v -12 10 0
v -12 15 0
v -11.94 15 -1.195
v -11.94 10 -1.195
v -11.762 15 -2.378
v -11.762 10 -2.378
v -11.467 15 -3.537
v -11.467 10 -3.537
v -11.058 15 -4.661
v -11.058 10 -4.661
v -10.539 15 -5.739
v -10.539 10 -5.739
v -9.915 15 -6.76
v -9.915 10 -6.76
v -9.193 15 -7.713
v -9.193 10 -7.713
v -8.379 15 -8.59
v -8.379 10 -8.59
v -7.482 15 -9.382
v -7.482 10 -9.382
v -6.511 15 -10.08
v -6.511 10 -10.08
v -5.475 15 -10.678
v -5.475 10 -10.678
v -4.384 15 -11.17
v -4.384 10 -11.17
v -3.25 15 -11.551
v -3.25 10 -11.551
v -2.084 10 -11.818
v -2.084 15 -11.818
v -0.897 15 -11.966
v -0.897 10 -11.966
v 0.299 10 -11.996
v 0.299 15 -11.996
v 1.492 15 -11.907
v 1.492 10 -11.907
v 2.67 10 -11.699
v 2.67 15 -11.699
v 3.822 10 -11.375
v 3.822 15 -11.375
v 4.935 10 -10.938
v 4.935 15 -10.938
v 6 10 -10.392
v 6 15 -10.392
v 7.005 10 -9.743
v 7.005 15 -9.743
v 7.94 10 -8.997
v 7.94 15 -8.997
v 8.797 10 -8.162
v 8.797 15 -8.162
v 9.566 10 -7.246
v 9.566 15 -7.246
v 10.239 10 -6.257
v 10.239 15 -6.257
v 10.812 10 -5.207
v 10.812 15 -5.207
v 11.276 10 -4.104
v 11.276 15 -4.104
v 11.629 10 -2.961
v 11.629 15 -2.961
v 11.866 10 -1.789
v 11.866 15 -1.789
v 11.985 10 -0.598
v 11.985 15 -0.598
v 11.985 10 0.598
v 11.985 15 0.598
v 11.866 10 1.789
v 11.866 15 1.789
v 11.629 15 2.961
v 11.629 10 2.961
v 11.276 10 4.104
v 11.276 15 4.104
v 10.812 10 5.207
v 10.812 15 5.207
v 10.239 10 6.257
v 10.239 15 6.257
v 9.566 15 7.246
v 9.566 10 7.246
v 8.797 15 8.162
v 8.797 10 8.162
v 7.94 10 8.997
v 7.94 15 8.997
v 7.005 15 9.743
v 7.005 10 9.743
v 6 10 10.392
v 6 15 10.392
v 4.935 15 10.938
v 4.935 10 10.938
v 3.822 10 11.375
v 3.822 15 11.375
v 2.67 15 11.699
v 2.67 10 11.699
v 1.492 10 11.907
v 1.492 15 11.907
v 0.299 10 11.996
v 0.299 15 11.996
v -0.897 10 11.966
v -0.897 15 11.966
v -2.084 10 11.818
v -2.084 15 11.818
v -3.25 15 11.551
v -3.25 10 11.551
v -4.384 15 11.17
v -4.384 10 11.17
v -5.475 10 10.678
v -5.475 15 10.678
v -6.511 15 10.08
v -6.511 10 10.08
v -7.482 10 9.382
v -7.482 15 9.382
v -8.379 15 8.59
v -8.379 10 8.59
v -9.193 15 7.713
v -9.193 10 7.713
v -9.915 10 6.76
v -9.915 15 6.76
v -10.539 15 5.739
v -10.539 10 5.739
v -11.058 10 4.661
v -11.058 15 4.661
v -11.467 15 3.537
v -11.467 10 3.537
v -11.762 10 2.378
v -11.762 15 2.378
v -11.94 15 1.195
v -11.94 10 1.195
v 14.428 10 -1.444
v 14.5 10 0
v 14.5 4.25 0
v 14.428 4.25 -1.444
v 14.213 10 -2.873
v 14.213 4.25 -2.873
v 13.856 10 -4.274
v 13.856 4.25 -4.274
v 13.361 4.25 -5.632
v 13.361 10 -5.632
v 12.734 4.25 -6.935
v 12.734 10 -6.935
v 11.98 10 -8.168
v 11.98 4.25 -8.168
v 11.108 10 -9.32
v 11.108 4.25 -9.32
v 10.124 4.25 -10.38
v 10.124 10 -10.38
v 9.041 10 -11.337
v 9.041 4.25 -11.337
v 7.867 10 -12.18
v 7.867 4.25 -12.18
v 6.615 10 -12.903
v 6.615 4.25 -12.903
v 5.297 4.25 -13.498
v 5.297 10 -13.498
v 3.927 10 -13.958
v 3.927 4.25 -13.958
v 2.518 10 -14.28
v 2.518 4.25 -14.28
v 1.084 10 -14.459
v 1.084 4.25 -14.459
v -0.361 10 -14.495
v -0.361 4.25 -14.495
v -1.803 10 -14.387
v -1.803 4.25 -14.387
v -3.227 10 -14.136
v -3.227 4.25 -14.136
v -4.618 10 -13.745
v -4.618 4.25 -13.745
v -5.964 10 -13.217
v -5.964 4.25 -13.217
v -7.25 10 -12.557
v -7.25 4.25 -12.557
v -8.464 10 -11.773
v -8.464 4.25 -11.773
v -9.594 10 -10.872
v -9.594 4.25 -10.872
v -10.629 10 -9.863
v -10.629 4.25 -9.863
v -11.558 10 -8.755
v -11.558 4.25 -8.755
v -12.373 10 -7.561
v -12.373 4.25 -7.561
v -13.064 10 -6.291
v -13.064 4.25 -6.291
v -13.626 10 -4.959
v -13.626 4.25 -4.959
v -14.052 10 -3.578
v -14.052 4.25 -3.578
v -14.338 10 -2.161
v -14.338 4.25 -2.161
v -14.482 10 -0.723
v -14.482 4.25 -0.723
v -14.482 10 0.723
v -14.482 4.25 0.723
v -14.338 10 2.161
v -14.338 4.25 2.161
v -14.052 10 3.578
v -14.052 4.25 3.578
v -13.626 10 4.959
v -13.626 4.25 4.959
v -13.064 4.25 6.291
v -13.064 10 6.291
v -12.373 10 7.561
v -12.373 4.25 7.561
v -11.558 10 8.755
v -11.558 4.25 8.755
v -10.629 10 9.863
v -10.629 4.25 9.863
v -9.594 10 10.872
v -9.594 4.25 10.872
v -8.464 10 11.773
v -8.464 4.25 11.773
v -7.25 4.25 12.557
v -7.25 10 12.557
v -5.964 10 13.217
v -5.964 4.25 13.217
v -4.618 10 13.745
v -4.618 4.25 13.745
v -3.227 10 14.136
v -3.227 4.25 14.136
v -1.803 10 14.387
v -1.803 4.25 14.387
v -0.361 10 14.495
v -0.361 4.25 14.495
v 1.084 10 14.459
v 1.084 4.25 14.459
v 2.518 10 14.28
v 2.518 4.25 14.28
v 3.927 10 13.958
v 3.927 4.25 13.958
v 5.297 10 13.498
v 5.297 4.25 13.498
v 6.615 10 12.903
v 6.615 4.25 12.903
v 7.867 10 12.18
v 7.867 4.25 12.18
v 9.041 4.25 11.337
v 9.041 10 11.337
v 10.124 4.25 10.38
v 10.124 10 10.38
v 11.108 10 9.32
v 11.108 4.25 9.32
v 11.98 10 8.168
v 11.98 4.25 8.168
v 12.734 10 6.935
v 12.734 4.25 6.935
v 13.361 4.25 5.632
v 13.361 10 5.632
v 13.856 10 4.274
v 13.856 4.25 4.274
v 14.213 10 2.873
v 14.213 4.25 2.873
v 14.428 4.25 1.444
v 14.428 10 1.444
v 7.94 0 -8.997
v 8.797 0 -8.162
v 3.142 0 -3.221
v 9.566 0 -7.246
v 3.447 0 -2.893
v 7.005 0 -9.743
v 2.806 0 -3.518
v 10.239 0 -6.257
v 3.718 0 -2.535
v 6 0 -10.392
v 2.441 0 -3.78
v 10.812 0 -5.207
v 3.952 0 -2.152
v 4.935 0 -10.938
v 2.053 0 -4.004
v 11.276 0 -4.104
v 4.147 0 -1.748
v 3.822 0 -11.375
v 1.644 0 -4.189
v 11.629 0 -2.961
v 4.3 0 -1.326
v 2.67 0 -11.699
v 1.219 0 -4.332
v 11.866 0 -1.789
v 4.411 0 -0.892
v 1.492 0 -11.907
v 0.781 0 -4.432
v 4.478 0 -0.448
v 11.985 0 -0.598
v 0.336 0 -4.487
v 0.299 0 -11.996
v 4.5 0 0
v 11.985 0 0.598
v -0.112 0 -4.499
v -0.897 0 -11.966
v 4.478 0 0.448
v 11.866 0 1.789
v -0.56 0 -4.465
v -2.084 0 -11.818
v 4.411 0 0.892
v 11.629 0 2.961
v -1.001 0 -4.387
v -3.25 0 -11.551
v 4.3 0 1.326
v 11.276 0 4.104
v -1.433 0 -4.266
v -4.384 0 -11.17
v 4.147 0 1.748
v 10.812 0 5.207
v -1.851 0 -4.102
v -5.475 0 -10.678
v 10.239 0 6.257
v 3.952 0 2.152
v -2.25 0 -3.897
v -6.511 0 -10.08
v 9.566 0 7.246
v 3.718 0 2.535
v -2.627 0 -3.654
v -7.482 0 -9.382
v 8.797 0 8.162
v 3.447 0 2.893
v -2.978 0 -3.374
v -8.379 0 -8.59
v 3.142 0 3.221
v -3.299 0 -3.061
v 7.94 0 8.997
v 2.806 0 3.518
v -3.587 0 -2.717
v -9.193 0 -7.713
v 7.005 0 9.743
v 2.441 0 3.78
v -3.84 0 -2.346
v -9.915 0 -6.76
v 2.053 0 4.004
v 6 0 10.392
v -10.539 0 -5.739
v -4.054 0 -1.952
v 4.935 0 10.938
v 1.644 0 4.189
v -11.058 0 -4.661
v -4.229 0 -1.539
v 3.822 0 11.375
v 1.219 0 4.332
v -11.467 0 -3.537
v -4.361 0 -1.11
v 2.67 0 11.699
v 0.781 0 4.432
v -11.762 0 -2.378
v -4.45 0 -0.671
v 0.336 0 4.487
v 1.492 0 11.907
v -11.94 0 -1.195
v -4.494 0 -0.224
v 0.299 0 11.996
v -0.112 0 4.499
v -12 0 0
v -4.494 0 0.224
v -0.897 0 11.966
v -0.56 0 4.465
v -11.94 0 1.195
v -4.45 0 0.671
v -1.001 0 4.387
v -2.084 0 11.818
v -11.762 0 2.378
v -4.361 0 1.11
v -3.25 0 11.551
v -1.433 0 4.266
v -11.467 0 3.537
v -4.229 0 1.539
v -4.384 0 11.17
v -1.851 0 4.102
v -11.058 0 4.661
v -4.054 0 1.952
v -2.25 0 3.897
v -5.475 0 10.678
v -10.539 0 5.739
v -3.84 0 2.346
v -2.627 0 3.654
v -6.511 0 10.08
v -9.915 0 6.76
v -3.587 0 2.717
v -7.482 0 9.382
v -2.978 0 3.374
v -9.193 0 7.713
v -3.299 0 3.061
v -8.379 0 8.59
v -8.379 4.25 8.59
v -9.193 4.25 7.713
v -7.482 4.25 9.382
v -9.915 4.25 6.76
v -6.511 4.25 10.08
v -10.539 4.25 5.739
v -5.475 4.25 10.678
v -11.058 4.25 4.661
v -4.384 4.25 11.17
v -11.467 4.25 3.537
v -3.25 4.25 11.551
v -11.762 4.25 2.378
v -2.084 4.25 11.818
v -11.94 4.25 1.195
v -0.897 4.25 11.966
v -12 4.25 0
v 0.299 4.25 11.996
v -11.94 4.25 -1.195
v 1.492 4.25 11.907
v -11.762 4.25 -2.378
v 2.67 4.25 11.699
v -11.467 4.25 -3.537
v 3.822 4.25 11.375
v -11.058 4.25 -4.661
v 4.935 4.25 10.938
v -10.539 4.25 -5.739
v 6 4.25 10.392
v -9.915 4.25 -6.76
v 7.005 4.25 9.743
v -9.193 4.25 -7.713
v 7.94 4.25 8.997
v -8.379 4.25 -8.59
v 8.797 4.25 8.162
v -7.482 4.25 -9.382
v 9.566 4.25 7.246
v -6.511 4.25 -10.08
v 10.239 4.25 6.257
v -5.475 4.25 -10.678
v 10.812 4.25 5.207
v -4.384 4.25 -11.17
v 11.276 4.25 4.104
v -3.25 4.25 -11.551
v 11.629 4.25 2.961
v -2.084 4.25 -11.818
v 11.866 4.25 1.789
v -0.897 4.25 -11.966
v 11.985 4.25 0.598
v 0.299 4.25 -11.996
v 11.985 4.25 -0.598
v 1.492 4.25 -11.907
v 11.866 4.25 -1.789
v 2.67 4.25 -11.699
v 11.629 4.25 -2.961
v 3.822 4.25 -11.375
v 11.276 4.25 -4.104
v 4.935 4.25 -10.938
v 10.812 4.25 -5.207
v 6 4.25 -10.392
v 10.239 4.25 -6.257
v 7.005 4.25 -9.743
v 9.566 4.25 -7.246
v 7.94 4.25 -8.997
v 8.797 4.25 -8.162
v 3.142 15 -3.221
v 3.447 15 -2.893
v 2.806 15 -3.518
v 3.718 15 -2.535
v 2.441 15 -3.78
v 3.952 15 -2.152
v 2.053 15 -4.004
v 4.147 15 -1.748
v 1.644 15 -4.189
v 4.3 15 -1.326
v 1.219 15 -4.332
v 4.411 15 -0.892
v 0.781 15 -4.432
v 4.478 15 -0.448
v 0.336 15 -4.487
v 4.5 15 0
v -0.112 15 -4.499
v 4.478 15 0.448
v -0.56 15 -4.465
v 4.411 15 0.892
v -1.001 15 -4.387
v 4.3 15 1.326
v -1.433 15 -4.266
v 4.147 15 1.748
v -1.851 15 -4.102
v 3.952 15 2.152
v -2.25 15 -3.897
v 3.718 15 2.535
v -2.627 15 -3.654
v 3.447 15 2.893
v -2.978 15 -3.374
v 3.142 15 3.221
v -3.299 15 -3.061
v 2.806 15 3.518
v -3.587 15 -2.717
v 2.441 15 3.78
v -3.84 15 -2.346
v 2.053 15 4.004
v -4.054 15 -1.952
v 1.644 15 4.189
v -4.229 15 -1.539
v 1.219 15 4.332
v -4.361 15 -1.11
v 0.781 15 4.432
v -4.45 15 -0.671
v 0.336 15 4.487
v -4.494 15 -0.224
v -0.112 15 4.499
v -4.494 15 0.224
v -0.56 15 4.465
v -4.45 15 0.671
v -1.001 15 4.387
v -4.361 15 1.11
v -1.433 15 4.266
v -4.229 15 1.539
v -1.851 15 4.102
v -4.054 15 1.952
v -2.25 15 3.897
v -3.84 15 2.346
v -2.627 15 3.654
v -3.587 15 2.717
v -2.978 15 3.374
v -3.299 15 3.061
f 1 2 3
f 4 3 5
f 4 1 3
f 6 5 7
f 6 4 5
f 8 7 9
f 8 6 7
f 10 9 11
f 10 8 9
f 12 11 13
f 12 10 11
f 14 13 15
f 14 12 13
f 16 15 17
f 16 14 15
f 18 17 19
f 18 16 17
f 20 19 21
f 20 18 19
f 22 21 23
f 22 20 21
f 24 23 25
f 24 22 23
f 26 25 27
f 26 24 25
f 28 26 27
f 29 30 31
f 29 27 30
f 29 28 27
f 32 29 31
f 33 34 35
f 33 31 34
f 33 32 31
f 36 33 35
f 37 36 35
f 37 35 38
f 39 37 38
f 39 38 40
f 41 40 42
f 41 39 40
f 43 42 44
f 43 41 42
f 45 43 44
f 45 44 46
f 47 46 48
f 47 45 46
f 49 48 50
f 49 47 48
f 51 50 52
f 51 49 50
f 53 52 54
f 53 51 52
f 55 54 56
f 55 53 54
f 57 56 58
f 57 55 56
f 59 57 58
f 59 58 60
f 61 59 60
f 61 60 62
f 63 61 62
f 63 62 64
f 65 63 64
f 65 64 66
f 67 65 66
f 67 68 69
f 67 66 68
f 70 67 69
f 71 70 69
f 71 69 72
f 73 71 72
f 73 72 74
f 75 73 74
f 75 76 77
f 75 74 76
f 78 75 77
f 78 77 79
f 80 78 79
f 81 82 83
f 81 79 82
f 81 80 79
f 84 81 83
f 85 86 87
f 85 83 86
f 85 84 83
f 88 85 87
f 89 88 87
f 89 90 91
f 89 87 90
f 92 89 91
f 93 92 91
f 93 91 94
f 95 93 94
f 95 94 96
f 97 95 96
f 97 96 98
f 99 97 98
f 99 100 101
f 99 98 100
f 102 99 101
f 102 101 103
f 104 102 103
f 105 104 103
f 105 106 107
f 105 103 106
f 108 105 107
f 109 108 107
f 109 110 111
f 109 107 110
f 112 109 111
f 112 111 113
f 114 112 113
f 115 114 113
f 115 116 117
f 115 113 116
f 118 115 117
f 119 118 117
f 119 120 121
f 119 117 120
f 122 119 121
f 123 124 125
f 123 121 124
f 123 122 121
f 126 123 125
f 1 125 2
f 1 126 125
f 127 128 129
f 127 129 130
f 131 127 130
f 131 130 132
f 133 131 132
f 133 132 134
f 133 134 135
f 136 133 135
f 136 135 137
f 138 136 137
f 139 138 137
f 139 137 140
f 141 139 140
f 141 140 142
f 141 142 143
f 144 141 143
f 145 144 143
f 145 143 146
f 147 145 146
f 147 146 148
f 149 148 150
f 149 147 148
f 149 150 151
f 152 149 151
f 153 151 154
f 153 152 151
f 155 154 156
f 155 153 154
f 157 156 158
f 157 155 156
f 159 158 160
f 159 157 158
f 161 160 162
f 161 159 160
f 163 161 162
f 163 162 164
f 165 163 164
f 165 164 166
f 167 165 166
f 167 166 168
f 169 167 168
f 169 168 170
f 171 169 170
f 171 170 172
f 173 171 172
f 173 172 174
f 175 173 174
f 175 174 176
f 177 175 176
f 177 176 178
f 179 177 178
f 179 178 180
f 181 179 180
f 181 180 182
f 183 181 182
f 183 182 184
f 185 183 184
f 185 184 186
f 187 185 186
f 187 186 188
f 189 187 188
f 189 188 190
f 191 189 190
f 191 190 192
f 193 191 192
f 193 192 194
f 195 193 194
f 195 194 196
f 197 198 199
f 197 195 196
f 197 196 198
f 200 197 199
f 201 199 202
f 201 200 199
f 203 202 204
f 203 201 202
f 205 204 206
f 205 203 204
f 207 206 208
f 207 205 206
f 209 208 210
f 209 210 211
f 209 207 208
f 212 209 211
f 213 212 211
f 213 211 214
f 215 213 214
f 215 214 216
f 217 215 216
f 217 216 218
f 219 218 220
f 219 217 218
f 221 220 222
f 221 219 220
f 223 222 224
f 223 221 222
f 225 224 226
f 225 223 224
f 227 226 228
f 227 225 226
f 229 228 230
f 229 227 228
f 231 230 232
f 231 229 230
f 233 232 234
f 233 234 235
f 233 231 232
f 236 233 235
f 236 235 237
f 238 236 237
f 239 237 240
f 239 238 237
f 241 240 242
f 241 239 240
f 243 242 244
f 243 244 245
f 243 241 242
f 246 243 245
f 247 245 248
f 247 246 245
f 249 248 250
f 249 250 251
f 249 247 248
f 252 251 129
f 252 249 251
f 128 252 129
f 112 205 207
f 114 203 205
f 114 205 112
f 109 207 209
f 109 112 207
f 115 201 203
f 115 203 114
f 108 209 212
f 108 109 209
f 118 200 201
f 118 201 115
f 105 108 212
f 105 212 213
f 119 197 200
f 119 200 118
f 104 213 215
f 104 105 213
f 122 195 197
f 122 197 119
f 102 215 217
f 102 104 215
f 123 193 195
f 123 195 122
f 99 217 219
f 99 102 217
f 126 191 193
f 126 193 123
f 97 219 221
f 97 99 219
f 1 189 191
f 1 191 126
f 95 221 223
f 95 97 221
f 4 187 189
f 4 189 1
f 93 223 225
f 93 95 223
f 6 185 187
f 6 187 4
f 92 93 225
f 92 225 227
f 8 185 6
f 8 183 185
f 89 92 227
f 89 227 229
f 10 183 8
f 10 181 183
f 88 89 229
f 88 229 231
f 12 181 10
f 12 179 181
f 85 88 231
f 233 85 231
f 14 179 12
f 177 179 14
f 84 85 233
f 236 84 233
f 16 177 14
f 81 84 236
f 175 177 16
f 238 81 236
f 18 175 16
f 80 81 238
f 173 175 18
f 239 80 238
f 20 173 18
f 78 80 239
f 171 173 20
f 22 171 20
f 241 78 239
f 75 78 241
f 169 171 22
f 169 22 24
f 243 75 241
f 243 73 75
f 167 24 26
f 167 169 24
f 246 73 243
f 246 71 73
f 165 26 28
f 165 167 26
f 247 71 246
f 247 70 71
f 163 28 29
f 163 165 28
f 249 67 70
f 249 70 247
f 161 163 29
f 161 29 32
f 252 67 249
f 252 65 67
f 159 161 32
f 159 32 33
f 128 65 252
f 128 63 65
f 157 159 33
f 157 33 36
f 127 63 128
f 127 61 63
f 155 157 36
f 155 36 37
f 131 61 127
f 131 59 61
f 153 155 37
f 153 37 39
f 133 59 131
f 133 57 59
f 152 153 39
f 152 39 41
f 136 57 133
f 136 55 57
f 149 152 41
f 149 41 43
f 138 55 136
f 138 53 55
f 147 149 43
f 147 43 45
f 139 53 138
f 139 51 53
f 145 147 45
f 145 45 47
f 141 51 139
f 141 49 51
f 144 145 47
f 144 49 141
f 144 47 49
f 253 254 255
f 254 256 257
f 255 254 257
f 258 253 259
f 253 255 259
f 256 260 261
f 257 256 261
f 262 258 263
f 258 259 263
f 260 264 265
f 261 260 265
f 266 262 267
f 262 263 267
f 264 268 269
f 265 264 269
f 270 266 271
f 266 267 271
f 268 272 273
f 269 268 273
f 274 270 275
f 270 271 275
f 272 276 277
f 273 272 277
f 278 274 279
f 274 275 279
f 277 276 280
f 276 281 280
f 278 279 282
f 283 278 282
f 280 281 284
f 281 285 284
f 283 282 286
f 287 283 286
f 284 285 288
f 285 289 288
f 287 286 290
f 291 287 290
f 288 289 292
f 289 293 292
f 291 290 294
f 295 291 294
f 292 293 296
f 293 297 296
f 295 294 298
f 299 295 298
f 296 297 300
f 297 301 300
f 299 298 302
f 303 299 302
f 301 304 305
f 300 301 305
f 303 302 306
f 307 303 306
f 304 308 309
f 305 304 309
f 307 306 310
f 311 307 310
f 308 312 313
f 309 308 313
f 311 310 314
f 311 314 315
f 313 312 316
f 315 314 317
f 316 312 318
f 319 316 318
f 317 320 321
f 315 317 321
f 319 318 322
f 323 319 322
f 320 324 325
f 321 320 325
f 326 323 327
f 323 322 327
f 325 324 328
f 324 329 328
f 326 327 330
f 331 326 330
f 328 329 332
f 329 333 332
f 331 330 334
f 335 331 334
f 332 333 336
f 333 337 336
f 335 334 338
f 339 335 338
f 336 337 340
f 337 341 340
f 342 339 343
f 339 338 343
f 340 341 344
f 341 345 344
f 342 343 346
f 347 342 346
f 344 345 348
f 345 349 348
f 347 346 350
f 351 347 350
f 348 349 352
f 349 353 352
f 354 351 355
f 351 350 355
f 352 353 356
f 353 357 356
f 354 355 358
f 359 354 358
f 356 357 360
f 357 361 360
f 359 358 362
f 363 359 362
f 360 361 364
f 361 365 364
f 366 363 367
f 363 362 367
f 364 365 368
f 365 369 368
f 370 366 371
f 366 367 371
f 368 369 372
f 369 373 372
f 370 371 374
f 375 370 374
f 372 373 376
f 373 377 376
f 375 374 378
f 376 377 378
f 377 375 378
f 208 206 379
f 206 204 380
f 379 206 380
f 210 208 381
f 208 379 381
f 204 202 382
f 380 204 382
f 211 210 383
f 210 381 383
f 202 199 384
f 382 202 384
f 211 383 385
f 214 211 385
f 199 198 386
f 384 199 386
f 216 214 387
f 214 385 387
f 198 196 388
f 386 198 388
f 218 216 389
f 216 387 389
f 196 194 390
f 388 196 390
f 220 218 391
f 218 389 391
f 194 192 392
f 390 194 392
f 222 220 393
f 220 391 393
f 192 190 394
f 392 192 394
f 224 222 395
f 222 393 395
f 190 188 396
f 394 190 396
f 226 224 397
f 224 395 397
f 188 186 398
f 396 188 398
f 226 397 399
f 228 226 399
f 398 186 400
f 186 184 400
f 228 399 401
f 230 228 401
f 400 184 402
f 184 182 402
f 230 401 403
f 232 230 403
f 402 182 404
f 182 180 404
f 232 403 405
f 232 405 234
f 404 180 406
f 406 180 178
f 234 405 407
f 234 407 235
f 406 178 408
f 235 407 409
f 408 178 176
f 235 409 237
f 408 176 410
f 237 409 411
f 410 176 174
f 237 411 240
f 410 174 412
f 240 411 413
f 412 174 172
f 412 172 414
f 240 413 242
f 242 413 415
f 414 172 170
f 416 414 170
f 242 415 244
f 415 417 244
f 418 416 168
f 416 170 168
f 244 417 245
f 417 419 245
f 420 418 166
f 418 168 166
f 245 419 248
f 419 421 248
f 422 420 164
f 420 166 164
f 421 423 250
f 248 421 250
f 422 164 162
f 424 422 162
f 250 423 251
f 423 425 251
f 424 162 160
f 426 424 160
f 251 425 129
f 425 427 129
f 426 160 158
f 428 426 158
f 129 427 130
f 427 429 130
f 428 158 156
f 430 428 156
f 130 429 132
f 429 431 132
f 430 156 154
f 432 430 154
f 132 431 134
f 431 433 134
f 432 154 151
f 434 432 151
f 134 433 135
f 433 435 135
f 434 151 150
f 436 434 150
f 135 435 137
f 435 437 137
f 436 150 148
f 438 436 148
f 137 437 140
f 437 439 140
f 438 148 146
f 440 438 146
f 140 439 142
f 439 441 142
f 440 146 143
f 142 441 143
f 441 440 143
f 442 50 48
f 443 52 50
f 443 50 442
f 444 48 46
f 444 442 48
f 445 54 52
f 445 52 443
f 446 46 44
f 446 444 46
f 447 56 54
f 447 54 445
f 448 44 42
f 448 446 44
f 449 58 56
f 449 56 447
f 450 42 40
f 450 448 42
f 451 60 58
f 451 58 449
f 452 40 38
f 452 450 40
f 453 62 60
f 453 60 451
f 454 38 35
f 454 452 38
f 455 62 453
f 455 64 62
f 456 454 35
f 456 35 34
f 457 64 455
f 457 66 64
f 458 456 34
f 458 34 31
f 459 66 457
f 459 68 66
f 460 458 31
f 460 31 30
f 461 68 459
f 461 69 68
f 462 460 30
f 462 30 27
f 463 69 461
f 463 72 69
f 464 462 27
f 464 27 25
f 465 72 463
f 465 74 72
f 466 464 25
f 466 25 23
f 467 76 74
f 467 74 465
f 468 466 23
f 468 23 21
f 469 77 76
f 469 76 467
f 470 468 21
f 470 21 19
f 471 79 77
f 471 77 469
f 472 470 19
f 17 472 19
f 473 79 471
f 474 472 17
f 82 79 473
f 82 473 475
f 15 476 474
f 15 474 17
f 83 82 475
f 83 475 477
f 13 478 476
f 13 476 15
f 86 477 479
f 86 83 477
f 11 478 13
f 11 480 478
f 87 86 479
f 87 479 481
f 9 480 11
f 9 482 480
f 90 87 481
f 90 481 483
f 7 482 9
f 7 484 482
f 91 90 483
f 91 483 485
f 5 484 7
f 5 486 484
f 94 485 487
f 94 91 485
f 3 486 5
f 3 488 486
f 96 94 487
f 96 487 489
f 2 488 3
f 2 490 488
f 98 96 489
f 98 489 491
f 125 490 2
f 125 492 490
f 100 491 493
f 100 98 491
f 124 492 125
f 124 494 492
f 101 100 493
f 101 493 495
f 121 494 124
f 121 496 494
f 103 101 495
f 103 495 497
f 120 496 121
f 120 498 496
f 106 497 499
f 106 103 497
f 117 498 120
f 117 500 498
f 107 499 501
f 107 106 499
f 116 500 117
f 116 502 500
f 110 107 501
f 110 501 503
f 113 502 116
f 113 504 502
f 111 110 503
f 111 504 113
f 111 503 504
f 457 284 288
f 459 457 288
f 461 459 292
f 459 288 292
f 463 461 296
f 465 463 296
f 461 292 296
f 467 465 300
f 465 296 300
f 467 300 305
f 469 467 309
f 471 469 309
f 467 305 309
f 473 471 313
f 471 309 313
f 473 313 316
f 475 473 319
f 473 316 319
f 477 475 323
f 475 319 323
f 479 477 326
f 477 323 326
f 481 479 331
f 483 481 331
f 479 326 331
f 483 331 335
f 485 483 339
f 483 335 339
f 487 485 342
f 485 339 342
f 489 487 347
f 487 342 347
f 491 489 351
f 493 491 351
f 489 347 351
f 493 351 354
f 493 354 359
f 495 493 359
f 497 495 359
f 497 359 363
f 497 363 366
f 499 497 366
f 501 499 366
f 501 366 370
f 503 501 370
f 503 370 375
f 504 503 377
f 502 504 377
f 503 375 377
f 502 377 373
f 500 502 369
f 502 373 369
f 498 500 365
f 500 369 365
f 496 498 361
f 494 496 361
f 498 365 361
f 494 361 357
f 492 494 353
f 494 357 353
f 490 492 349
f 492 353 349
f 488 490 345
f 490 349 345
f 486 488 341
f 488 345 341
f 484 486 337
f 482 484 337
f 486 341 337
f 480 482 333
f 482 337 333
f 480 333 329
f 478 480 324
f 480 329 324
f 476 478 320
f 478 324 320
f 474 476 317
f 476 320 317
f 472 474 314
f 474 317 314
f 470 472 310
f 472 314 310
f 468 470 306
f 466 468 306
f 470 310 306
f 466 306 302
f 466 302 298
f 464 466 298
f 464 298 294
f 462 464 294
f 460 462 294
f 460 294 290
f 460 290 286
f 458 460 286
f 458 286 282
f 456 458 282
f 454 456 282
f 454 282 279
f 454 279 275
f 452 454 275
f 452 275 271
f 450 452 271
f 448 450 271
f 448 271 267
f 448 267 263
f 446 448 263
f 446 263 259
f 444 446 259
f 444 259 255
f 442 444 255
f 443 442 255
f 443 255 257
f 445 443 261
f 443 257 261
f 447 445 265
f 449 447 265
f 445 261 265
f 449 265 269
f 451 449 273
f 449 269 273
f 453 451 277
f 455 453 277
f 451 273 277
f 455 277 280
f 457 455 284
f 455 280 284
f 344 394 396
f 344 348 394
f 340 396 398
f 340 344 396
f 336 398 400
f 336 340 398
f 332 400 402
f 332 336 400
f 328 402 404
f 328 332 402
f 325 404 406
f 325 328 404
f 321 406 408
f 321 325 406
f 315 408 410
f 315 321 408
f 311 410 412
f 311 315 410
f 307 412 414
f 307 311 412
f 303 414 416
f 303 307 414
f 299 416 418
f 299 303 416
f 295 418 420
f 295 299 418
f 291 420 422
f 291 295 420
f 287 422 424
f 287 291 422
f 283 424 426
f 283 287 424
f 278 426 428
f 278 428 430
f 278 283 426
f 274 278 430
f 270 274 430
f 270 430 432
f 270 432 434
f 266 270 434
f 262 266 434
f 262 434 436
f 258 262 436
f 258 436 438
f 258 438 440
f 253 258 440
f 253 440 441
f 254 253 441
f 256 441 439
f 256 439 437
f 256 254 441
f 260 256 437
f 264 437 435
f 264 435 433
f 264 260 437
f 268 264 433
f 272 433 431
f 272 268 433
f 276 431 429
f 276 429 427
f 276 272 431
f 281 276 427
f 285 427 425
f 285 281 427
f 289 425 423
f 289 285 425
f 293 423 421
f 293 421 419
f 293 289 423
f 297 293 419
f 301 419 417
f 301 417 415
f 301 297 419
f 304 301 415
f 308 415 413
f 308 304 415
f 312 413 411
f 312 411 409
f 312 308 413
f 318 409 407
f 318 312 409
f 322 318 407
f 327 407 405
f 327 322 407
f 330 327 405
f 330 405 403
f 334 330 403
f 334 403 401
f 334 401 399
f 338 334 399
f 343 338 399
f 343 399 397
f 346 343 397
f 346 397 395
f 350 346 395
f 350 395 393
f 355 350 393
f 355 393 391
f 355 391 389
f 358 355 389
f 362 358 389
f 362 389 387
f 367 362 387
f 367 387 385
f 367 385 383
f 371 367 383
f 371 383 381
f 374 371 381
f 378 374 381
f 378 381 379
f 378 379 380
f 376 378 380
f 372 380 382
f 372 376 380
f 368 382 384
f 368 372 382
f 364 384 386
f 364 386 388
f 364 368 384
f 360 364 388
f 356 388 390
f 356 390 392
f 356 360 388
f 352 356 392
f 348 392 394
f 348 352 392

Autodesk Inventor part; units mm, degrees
ref_plane "YZ Plane" through (0, 0, 0) normal (1, 0, 0) x (0, 1, 0)
ref_plane "XZ Plane" through (0, 0, 0) normal (0, 1, 0) x (-1, 0, 0)
sketch "Sketch1" plane through (0, 0, 0) normal (0, 1, 0) x (-1, 0, 0)
  circle A0 centre (0, 0) radius 12
  dimension "d0" = 24
extrude "Extrusion1" add sketch "Sketch1" along normal blind 15
ref_plane "Work Plane1" through (0, 10, 0) normal (0, 1, 0) x (1, 0, 0)
sketch "Sketch3" plane through (0, 10, 0) normal (0, 1, 0) x (1, 0, 0)
  circle A0 centre (0, 0) radius 14.5
  dimension "d5" = 29
extrude "Extrusion2" add sketch "Sketch3" against normal blind 5.75
sketch "Sketch4" plane through (0, 0, 0) normal (0, -1, 0) x (1, 0, 0)
  circle A0 centre (0, 0) radius 4.5
  dimension "d8" = 9
extrude "Extrusion3" cut sketch "Sketch4" against normal up to next
properties part number "RollerWheel"
